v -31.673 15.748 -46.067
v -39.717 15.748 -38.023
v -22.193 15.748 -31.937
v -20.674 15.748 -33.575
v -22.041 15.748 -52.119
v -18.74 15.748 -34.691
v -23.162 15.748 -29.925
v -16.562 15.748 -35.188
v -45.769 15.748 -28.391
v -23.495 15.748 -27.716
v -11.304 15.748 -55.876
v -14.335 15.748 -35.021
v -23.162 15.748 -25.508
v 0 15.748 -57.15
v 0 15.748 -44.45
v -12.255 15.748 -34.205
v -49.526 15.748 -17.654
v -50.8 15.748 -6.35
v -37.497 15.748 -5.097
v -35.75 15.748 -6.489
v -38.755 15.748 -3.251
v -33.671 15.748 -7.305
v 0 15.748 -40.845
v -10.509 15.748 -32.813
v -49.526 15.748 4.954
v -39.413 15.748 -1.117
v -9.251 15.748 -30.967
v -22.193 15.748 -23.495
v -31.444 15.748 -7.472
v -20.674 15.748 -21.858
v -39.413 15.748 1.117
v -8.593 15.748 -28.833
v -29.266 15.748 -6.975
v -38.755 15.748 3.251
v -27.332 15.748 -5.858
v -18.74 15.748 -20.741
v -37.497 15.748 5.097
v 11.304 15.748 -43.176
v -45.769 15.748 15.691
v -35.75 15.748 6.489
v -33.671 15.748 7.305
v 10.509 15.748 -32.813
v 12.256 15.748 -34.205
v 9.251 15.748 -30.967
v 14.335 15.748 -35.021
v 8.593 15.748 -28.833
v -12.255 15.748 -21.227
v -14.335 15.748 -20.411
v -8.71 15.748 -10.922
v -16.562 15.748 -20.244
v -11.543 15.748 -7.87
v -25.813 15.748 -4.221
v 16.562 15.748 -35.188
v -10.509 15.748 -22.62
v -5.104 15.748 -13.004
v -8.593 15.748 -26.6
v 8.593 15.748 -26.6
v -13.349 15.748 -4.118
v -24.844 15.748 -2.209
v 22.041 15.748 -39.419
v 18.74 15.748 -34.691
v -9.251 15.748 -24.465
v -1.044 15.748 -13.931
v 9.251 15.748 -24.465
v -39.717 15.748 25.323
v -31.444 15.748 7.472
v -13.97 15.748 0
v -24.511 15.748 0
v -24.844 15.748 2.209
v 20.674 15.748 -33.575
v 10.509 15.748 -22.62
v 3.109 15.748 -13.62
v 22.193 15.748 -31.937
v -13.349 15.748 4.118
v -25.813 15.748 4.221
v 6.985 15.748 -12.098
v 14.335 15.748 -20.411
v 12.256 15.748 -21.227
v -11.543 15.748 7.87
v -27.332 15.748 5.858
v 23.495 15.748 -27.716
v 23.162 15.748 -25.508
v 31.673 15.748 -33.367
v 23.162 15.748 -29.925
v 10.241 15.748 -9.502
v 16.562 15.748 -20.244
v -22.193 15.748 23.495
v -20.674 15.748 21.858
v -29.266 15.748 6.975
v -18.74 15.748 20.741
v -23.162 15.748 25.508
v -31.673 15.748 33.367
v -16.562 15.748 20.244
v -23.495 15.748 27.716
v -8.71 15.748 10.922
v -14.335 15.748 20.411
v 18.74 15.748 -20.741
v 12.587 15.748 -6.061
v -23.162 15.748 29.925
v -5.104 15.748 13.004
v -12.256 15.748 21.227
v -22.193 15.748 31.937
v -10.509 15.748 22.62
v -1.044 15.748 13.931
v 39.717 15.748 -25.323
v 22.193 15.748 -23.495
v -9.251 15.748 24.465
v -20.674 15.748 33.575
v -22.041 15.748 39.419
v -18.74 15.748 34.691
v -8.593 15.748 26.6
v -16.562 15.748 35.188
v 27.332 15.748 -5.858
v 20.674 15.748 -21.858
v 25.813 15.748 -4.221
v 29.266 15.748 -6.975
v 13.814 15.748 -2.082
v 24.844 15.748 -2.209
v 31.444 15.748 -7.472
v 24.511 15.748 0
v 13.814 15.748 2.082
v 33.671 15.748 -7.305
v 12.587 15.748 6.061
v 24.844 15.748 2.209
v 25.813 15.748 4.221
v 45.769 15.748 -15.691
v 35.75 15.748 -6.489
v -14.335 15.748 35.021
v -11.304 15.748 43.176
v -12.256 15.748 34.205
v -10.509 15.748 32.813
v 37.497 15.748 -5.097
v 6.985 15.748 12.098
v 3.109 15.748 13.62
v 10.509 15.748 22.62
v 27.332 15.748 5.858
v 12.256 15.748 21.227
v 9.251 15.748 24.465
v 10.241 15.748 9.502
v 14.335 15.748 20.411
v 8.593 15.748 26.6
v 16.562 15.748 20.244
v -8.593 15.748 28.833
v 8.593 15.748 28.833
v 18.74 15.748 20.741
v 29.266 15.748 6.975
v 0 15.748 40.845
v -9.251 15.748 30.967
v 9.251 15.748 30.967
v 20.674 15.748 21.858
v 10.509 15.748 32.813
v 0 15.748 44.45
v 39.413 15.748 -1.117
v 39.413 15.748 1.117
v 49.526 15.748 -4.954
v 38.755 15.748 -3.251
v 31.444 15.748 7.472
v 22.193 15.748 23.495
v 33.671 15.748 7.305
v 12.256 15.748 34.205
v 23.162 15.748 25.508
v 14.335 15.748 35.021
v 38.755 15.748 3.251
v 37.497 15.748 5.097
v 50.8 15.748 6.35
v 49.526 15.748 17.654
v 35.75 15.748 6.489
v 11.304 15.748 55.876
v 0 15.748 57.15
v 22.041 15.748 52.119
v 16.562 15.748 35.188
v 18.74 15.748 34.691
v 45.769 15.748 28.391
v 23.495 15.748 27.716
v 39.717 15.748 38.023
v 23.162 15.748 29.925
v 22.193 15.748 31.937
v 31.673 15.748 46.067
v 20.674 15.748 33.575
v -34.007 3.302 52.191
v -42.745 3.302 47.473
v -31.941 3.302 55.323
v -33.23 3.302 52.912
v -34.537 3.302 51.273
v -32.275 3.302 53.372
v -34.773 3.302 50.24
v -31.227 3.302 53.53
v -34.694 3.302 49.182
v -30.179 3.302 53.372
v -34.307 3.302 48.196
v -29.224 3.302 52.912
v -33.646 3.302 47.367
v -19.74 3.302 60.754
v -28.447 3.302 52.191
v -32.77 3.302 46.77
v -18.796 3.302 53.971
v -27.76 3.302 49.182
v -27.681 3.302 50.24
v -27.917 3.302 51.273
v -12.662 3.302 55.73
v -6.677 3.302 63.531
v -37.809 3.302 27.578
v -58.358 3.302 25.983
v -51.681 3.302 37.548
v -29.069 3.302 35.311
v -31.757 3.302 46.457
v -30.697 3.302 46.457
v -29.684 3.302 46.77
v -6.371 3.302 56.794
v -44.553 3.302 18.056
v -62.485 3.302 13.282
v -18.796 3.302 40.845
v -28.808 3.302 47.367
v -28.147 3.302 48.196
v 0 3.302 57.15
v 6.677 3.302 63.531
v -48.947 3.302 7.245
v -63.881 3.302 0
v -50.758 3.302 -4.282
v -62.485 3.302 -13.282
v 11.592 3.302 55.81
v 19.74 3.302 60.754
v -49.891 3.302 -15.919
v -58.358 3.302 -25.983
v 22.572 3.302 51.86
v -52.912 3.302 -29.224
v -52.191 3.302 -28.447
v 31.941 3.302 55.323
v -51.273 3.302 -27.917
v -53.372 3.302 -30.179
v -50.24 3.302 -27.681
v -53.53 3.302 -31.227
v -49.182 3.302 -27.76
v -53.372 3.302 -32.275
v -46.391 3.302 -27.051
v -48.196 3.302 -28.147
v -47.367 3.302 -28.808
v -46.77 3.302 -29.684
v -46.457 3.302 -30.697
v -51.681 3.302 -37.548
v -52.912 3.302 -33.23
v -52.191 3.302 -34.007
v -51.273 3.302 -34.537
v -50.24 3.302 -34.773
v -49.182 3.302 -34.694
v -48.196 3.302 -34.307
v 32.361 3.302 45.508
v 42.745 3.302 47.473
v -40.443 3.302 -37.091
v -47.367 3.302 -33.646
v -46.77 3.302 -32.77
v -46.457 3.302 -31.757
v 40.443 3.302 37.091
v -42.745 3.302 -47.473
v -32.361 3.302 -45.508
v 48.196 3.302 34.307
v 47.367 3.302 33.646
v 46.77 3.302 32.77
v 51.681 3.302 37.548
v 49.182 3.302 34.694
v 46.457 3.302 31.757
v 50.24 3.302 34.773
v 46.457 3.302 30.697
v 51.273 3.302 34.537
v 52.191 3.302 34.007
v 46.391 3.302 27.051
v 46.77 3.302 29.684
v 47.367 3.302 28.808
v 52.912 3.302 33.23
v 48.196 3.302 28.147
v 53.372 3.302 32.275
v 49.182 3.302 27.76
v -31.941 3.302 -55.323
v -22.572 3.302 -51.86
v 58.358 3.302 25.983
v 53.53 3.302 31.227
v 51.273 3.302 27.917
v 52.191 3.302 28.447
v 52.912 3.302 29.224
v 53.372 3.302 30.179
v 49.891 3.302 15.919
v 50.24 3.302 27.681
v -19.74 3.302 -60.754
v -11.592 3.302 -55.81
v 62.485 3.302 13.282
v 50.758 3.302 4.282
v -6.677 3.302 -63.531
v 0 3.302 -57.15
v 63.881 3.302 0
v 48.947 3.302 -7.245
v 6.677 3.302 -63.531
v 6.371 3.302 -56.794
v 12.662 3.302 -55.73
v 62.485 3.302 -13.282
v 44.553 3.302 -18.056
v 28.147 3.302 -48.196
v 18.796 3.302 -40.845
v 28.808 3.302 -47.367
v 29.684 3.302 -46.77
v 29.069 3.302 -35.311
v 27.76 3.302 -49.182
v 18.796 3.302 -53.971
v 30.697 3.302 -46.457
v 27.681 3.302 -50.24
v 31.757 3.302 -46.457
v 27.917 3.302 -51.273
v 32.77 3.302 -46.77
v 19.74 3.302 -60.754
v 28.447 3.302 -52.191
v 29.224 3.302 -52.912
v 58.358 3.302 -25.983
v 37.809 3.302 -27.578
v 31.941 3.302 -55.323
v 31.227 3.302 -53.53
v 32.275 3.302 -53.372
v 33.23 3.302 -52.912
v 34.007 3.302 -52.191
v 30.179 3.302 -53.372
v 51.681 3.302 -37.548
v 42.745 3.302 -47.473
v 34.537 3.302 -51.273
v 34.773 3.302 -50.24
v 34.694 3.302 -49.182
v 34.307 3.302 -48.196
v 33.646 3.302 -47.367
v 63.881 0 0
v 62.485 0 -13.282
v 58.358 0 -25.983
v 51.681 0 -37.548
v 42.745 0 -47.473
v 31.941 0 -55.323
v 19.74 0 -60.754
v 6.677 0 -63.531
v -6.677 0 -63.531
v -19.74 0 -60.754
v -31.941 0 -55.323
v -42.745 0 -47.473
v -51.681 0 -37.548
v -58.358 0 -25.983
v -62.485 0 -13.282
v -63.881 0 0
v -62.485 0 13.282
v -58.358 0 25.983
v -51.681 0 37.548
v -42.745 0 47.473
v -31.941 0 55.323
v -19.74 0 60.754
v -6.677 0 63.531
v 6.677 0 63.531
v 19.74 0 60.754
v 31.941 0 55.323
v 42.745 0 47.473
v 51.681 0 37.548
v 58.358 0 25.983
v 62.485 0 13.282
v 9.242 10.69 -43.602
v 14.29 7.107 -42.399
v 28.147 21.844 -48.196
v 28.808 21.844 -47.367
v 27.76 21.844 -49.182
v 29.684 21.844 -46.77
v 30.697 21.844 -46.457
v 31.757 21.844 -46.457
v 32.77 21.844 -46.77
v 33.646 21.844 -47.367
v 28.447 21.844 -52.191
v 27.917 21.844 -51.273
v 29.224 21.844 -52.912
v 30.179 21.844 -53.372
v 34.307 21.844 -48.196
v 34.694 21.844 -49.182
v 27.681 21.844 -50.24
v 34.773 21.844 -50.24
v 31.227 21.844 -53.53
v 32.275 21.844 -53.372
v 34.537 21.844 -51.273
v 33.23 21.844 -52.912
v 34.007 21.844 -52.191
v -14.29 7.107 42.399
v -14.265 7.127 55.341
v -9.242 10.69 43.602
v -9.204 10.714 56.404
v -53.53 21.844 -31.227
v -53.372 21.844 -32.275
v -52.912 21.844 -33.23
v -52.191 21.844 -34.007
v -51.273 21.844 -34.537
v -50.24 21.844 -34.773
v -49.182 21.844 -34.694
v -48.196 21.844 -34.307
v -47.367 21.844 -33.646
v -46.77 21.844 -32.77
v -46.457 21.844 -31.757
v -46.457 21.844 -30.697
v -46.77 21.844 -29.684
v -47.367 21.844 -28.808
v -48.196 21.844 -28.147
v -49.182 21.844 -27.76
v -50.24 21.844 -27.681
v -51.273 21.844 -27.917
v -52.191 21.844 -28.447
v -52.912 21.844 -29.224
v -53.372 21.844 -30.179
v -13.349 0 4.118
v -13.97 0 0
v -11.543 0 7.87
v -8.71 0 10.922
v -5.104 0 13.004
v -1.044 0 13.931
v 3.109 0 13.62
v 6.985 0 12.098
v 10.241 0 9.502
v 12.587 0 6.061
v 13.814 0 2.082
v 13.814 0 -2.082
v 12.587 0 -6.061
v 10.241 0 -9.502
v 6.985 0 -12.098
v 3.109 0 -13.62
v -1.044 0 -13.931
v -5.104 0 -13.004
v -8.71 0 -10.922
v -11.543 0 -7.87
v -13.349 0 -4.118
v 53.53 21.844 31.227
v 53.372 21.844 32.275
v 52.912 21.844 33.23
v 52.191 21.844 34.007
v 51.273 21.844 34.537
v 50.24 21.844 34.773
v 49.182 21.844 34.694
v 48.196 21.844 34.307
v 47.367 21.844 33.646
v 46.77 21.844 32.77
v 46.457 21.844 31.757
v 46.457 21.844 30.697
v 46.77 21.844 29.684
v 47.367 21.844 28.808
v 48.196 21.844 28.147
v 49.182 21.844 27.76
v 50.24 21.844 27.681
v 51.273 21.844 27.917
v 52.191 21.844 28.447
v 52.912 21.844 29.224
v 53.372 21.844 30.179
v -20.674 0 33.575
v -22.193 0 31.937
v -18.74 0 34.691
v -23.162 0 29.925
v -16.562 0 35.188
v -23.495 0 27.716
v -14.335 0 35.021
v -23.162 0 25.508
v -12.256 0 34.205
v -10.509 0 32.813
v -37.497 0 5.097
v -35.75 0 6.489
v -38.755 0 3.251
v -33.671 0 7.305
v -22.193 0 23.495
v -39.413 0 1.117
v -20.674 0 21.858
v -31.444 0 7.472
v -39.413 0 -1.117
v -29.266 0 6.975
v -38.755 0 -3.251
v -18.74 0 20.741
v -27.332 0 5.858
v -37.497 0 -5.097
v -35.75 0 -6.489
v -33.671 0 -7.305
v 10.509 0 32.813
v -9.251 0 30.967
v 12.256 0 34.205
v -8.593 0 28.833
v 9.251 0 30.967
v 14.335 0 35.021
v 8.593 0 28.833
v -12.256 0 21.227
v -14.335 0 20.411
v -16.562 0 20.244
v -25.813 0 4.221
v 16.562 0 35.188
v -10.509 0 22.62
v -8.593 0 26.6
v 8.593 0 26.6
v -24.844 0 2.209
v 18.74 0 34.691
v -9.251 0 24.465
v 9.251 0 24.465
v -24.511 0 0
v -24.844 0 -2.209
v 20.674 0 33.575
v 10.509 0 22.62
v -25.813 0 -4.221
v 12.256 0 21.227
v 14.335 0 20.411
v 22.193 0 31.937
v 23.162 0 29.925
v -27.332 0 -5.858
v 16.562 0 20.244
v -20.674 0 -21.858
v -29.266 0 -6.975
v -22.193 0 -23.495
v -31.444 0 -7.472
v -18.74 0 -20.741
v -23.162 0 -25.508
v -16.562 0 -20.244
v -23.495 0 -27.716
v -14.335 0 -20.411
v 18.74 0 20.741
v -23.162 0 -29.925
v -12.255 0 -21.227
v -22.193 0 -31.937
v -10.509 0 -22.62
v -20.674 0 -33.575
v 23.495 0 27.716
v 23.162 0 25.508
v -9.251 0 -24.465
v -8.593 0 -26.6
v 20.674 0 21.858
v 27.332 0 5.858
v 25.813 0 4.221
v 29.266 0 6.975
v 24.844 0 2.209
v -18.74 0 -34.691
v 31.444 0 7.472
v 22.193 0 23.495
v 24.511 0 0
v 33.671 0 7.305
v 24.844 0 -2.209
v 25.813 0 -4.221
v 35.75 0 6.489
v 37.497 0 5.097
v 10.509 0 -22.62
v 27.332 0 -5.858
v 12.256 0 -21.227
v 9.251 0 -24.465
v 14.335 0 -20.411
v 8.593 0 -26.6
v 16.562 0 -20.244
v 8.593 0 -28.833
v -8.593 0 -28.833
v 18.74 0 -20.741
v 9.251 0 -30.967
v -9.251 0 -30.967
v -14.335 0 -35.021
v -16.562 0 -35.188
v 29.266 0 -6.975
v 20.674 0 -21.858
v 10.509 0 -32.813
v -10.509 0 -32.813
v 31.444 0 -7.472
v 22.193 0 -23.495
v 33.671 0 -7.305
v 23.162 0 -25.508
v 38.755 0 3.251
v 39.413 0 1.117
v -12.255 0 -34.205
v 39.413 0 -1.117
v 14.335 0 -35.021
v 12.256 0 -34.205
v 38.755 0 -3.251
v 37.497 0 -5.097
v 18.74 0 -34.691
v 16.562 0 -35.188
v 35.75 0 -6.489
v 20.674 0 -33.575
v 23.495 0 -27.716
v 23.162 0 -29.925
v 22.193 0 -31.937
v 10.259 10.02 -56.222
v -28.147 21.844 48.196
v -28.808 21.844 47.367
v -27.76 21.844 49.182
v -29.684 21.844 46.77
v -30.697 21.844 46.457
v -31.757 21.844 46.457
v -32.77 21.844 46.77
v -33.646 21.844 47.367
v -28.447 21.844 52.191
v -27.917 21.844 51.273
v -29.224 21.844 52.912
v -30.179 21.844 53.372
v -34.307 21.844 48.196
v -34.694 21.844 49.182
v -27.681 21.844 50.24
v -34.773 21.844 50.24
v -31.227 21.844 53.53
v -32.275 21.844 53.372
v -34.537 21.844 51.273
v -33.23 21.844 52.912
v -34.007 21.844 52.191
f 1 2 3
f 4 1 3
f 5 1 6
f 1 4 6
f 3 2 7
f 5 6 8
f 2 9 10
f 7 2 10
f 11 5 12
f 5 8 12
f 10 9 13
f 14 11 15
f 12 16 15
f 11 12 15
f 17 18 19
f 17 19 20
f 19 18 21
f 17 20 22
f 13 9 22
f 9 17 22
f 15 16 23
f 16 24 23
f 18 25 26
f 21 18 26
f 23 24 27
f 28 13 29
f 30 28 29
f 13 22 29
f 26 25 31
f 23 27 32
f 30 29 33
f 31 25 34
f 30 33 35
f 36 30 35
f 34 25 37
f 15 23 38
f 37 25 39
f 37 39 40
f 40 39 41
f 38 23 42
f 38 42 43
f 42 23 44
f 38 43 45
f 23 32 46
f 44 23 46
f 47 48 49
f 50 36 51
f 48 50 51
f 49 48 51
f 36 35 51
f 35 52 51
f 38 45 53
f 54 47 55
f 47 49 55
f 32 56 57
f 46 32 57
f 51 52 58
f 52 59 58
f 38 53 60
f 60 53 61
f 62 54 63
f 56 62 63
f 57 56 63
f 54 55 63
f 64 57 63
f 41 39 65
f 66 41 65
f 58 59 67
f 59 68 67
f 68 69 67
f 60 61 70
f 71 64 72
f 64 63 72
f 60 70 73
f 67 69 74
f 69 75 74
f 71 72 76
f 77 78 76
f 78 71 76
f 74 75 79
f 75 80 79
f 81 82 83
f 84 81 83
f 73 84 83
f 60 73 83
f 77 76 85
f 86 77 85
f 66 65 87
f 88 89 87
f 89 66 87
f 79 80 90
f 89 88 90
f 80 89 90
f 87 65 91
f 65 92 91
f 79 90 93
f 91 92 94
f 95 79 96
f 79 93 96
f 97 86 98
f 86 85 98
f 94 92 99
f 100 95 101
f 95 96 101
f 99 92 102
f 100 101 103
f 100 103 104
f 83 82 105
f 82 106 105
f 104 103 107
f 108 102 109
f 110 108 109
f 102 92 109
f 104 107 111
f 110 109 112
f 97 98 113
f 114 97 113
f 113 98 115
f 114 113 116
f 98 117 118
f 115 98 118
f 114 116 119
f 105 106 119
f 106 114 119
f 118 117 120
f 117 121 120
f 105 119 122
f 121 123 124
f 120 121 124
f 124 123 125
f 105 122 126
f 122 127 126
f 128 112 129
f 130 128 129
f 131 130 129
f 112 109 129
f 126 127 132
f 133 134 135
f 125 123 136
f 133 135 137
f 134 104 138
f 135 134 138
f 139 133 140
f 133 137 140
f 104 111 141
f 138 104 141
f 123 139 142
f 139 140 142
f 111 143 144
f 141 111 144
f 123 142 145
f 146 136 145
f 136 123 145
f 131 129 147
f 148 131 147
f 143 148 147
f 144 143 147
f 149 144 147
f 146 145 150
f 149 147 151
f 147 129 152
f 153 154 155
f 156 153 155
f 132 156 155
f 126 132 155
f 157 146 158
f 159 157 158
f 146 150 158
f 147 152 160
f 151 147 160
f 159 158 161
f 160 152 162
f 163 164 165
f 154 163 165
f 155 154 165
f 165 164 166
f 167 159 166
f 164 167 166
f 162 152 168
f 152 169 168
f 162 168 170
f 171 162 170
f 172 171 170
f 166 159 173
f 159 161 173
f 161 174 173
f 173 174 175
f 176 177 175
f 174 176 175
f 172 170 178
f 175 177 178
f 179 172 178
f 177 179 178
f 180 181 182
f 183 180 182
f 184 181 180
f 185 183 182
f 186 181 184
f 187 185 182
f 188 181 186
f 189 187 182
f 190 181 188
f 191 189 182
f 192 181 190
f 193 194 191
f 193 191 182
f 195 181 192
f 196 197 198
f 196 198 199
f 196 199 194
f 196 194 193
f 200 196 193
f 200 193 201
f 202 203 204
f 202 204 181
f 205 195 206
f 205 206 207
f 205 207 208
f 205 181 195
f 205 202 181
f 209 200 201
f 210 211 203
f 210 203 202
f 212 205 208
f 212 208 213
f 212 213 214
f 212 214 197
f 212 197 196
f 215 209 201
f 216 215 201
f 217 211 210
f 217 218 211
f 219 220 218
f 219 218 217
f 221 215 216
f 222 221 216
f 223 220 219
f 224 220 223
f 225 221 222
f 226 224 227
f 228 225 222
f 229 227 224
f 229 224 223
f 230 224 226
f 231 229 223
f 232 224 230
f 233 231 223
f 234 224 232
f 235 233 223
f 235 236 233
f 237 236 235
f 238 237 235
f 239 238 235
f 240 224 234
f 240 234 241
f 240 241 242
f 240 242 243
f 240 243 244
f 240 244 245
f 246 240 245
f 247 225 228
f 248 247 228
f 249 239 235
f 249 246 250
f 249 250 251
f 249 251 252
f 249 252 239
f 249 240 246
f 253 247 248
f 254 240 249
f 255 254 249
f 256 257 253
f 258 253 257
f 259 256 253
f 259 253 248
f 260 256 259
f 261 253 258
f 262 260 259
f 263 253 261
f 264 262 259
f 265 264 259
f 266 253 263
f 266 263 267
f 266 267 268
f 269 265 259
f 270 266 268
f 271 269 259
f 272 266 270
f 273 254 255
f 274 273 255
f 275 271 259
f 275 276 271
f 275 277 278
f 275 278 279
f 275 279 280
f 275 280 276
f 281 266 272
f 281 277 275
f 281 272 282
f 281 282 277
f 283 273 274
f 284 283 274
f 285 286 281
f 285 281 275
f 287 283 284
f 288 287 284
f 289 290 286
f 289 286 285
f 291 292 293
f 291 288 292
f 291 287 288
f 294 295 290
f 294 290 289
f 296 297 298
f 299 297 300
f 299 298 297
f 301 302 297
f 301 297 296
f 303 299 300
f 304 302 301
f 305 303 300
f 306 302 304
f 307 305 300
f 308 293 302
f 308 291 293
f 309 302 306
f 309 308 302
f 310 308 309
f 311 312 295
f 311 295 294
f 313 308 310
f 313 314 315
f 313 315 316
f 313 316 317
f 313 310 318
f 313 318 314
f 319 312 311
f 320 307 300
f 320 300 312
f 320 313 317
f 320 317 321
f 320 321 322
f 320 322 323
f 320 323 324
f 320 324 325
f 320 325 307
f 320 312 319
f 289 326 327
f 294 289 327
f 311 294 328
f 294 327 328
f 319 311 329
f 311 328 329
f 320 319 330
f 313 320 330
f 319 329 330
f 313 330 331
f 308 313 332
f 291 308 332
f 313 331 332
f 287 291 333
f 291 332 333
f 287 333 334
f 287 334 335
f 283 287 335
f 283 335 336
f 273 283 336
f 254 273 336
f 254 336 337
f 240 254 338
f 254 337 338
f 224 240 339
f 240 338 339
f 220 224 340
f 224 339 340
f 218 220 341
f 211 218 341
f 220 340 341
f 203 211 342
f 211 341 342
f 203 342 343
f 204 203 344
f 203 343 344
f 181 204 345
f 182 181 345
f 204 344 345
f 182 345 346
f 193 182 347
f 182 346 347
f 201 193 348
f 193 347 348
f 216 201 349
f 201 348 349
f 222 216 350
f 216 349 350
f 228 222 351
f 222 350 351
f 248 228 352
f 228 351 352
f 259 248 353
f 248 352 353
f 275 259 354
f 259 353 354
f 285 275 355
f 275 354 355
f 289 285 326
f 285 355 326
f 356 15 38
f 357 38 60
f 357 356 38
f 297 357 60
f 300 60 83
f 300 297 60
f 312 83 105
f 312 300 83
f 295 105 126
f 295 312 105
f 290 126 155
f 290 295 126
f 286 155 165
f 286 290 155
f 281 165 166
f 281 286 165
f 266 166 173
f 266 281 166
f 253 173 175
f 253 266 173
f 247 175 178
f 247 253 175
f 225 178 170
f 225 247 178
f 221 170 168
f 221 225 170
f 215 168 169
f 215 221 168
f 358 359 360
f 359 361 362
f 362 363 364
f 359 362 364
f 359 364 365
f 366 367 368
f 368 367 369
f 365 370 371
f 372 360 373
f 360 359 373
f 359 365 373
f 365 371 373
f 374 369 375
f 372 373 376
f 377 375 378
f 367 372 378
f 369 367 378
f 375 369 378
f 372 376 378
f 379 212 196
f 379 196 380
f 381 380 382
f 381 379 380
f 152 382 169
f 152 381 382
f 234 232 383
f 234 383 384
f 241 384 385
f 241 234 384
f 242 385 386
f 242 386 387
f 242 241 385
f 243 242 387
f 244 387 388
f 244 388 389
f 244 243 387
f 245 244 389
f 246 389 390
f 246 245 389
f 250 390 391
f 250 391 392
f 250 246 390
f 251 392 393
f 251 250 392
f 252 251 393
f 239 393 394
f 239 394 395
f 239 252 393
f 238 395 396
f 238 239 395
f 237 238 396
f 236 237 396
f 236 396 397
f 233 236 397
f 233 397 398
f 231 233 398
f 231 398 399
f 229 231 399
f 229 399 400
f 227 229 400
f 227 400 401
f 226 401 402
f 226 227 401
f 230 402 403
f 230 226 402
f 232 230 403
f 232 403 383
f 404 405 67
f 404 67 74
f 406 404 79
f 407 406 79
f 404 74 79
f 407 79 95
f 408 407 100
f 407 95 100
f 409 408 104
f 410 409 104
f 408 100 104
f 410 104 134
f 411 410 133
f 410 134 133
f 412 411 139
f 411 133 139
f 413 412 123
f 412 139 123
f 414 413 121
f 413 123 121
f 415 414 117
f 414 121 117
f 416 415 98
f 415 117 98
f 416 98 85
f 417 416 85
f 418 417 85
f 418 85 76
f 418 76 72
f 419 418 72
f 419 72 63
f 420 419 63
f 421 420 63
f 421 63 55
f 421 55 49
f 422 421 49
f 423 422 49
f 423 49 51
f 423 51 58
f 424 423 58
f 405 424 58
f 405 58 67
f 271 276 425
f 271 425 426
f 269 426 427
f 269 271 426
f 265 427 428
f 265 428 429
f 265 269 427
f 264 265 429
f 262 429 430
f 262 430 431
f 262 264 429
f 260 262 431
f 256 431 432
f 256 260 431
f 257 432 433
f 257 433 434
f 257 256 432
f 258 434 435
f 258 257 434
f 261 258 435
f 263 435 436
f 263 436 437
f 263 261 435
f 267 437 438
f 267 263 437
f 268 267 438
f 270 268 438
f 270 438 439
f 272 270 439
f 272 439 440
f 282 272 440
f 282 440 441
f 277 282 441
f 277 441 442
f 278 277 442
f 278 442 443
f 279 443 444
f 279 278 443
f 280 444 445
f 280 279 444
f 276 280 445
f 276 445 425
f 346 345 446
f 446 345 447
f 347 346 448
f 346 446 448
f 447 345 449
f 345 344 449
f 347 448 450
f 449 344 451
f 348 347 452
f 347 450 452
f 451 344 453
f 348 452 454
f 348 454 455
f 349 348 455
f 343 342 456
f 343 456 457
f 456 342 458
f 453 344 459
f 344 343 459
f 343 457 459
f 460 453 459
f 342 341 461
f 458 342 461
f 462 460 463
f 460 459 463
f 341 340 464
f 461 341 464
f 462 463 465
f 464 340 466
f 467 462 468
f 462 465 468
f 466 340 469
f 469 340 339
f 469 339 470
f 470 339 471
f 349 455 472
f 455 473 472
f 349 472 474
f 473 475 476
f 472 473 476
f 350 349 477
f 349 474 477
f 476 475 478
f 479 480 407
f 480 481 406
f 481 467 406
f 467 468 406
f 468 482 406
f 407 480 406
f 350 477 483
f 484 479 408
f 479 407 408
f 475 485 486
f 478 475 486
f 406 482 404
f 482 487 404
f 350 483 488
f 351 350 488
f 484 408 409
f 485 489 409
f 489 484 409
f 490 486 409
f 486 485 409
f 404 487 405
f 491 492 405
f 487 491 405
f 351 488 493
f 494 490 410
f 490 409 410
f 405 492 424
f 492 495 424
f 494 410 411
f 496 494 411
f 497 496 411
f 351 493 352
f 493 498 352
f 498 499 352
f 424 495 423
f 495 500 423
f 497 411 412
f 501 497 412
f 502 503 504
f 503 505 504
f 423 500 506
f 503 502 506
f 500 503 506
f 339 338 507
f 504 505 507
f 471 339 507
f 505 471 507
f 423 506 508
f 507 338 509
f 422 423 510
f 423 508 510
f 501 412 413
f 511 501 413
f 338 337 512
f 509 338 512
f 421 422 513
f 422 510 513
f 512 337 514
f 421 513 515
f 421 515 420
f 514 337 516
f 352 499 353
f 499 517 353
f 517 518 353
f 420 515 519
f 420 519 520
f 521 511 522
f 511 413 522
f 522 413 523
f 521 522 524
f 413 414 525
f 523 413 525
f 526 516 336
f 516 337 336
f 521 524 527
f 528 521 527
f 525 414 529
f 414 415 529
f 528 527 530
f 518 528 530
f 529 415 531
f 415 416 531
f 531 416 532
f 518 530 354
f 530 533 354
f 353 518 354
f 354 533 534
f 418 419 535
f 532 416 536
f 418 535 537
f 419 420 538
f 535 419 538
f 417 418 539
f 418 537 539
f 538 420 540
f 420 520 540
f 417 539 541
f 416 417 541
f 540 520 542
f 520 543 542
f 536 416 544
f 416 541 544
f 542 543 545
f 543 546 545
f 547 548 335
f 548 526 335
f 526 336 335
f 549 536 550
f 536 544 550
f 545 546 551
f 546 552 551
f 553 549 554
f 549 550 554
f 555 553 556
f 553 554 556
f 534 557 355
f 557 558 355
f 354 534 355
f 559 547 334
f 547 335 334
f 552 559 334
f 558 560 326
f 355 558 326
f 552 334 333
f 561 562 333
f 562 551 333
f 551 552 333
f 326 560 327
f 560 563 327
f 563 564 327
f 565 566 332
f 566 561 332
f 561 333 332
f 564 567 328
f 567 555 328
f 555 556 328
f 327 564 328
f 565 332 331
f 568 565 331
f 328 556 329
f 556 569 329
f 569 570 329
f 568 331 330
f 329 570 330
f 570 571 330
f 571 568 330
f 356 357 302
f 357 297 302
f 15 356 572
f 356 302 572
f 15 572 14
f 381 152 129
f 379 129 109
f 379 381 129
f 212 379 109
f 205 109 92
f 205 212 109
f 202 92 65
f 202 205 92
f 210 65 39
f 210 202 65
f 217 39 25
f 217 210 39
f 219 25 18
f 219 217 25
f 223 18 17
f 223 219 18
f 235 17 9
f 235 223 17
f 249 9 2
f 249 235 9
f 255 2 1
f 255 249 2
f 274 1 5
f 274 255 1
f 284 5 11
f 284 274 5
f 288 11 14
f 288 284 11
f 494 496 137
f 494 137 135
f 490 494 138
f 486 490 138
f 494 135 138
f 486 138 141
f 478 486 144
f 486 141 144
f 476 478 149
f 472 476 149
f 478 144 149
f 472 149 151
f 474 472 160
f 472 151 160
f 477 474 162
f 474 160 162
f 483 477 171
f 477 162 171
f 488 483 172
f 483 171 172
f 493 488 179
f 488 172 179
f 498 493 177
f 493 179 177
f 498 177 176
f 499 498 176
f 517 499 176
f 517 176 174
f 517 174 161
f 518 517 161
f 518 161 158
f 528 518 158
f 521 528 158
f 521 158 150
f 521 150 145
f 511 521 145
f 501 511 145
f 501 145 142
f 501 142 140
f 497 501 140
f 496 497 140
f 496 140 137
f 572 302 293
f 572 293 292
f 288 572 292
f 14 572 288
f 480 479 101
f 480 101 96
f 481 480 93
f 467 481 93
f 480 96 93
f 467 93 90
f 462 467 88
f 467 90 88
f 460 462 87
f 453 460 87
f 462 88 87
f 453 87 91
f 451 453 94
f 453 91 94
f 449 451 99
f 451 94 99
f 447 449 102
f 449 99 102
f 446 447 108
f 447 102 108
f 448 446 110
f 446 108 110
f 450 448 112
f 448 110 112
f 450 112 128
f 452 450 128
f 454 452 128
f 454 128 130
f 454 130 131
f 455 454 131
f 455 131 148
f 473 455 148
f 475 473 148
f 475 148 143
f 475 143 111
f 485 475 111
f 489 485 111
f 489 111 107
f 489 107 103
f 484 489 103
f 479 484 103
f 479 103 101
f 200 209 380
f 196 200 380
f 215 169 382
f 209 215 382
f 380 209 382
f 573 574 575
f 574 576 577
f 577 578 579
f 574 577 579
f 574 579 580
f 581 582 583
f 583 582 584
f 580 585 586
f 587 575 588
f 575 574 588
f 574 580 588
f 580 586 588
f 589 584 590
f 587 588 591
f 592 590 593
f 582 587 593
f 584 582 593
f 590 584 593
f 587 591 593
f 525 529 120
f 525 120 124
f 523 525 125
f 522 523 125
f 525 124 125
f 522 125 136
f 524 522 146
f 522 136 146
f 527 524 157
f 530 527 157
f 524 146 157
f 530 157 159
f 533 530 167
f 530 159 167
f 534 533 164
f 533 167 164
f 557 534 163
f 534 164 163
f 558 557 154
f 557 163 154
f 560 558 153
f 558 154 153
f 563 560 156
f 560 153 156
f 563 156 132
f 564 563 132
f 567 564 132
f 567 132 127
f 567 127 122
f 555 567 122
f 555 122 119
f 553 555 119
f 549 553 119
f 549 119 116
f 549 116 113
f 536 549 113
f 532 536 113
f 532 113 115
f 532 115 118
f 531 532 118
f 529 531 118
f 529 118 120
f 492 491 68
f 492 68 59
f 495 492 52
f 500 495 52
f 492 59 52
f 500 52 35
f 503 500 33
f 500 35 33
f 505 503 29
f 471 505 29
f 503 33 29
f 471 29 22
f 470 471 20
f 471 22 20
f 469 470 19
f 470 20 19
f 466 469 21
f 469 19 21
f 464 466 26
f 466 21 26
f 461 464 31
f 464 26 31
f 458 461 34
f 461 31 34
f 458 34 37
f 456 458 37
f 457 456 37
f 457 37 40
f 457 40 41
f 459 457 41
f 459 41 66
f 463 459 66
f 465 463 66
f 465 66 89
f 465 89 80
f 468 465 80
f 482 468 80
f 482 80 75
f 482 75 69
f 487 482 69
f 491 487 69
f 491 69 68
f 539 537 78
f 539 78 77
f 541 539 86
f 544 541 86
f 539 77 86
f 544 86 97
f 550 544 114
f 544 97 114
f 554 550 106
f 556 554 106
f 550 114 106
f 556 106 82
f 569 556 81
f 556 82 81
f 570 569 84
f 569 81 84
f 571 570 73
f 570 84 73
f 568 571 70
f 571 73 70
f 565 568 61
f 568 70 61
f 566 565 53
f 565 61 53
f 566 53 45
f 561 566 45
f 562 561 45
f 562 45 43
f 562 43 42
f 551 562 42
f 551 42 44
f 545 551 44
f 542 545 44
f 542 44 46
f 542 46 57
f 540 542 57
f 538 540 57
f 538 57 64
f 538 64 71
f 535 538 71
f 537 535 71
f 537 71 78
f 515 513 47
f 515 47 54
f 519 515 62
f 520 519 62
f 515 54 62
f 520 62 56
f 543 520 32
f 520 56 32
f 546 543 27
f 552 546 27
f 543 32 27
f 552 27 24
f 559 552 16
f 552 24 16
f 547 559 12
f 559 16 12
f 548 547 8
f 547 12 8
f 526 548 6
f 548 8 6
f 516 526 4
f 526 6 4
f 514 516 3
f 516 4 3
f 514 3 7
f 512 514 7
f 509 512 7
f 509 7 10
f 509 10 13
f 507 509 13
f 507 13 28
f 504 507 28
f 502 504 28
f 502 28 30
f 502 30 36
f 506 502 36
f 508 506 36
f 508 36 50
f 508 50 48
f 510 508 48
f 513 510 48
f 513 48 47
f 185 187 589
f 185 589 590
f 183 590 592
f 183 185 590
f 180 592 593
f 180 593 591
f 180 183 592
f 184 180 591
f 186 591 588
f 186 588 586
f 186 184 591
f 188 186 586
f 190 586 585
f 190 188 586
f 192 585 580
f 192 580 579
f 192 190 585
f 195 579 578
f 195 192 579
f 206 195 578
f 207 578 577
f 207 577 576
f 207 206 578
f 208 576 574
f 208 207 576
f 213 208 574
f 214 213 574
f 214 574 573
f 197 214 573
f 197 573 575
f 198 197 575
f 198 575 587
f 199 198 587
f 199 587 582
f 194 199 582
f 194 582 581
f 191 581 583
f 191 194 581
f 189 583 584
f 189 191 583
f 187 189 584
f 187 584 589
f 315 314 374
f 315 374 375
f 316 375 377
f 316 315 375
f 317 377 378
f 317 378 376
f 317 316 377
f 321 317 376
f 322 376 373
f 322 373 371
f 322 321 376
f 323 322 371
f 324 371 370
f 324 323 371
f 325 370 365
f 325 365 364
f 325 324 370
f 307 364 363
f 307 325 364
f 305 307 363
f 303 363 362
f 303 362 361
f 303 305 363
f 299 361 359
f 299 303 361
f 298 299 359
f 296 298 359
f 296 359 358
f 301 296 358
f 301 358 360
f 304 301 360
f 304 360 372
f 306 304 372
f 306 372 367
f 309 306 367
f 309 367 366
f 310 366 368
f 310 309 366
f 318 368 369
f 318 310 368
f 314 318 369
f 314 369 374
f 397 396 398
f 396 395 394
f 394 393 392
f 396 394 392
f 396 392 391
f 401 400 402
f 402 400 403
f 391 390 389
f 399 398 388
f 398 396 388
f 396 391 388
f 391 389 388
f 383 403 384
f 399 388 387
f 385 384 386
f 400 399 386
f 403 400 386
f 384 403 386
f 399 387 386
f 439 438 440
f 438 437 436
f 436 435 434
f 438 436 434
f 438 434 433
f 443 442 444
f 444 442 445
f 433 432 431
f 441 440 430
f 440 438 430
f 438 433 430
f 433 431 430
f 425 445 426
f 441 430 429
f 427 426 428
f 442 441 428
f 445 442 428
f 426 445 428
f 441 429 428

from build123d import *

# Parameters (mm, degrees)
SKETCH1_R          = 63.881
EXTRUDE1_DEPTH     = 3.302
EXTRUDE2_DEPTH     = 12.446
SKETCH5_R          = 13.97
CUT_EXTRUDE3_DEPTH = 16.748
SKETCH7_R          = 7.493
CUT_EXTRUDE4_DEPTH = 16.748
CIRPATTERN1_COUNT  = 6
EXTRUDE3_START     = 40.844813
EXTRUDE3_DEPTH     = 16.305187
CUT_EXTRUDE5_DEPTH = 12.446
EXTRUDE4_START     = -57.15
EXTRUDE4_DEPTH     = 16.305187
CUT_EXTRUDE6_DEPTH = 12.446
SKETCH22_R         = 3.556
EXTRUDE5_DEPTH     = 18.542
CIRPATTERN2_COUNT  = 4


with BuildPart() as part:
    # Sketch1 → Extrude1 (new body)
    with BuildSketch(Plane(origin=(0, 0, 0), x_dir=(1, 0, 0), z_dir=(0, 1, 0))):
        Circle(SKETCH1_R)
    extrude(amount=EXTRUDE1_DEPTH)

    # Sketch4 → Extrude2 (add)
    with BuildSketch(Plane(origin=(0, 3.302, 0), x_dir=(-1, 0, 0), z_dir=(0, 1, 0))):
        with BuildLine():
            Line((0, -57.15), (0, -44.45))
            ThreePointArc((0, -44.45), (-50.8, 6.35), (0, 57.15))
            Line((0, 57.15), (0, 44.45))
            ThreePointArc((0, 44.45), (50.8, -6.35), (0, -57.15))
        make_face()
    extrude(amount=EXTRUDE2_DEPTH)

    # Sketch5 → Cut-Extrude3 (cut, through all)
    with BuildSketch(Plane(origin=(0, 15.748, 0), x_dir=(-1, 0, 0), z_dir=(0, 1, 0))):
        Circle(SKETCH5_R)
    extrude(amount=-CUT_EXTRUDE3_DEPTH, mode=Mode.SUBTRACT)

    # Sketch7 → Cut-Extrude4 (cut, through all)
    with BuildSketch(Plane(origin=(0, 15.748, 0), x_dir=(-1, 0, 0), z_dir=(0, 1, 0))):
        with Locations((-32.004, 0)):
            Circle(SKETCH7_R)
    cut_extrude4 = extrude(amount=-CUT_EXTRUDE4_DEPTH, mode=Mode.SUBTRACT)

    # CirPattern1: Cut-Extrude4 ×6 about axis
    cirpattern1_axis = Axis((0, 0, 0), (0, 1, 0))
    for i in range(1, CIRPATTERN1_COUNT):
        add(cut_extrude4.rotate(cirpattern1_axis, i * 360 / CIRPATTERN1_COUNT), mode=Mode.SUBTRACT)

    # Sketch18 → Extrude3 (add)
    with BuildSketch(Plane.XY.offset(EXTRUDE3_START)):
        with BuildLine():
            Line((0, 3.302), (-18.796, 3.302))
            ThreePointArc((-18.796, 3.302), (-9.88893997, 10.266419547), (0, 15.748))
            Line((0, 15.748), (0, 3.302))
        make_face()
    extrude(amount=EXTRUDE3_DEPTH)

    # Sketch19 → Cut-Extrude5 (cut)
    with BuildSketch(Plane(origin=(0, 15.748, 0), x_dir=(-1, 0, 0), z_dir=(0, 1, 0))):
        with BuildLine():
            Line((18.796, 53.970666885), (18.796, 57.15))
            Line((18.796, 57.15), (0, 57.15))
            ThreePointArc((0, 57.15), (9.531497457, 56.349561278), (18.796, 53.970666885))
        make_face()
    extrude(amount=-CUT_EXTRUDE5_DEPTH, mode=Mode.SUBTRACT)

    # Sketch20 → Extrude4 (add)
    with BuildSketch(Plane.XY.offset(EXTRUDE4_START)):
        with BuildLine():
            Line((0, 3.302), (18.796, 3.302))
            ThreePointArc((18.796, 3.302), (9.88893997, 10.266419547), (0, 15.748))
            Line((0, 15.748), (0, 3.302))
        make_face()
    extrude(amount=EXTRUDE4_DEPTH)

    # Sketch21 → Cut-Extrude6 (cut)
    with BuildSketch(Plane(origin=(0, 15.748, 0), x_dir=(-1, 0, 0), z_dir=(0, 1, 0))):
        with BuildLine():
            Line((0, -57.15), (-18.796, -57.15))
            Line((-18.796, -57.15), (-18.796, -53.970666885))
            ThreePointArc((-18.796, -53.970666885), (-9.531497457, -56.349561278), (0, -57.15))
        make_face()
    extrude(amount=-CUT_EXTRUDE6_DEPTH, mode=Mode.SUBTRACT)

    # Sketch22 → Extrude5 (add)
    with BuildSketch(Plane(origin=(0, 3.302, 57.15), x_dir=(1, 0, 0), z_dir=(0, -1, 0))):
        with Locations((49.97377821, -25.922917597)):
            Circle(SKETCH22_R)
    extrude5 = extrude(amount=-EXTRUDE5_DEPTH)

    # CirPattern2: Extrude5 ×4 about axis
    cirpattern2_axis = Axis((0, 0, 0), (0, 1, 0))
    for i in range(1, CIRPATTERN2_COUNT):
        add(extrude5.rotate(cirpattern2_axis, i * 360 / CIRPATTERN2_COUNT))


solid = part.part
